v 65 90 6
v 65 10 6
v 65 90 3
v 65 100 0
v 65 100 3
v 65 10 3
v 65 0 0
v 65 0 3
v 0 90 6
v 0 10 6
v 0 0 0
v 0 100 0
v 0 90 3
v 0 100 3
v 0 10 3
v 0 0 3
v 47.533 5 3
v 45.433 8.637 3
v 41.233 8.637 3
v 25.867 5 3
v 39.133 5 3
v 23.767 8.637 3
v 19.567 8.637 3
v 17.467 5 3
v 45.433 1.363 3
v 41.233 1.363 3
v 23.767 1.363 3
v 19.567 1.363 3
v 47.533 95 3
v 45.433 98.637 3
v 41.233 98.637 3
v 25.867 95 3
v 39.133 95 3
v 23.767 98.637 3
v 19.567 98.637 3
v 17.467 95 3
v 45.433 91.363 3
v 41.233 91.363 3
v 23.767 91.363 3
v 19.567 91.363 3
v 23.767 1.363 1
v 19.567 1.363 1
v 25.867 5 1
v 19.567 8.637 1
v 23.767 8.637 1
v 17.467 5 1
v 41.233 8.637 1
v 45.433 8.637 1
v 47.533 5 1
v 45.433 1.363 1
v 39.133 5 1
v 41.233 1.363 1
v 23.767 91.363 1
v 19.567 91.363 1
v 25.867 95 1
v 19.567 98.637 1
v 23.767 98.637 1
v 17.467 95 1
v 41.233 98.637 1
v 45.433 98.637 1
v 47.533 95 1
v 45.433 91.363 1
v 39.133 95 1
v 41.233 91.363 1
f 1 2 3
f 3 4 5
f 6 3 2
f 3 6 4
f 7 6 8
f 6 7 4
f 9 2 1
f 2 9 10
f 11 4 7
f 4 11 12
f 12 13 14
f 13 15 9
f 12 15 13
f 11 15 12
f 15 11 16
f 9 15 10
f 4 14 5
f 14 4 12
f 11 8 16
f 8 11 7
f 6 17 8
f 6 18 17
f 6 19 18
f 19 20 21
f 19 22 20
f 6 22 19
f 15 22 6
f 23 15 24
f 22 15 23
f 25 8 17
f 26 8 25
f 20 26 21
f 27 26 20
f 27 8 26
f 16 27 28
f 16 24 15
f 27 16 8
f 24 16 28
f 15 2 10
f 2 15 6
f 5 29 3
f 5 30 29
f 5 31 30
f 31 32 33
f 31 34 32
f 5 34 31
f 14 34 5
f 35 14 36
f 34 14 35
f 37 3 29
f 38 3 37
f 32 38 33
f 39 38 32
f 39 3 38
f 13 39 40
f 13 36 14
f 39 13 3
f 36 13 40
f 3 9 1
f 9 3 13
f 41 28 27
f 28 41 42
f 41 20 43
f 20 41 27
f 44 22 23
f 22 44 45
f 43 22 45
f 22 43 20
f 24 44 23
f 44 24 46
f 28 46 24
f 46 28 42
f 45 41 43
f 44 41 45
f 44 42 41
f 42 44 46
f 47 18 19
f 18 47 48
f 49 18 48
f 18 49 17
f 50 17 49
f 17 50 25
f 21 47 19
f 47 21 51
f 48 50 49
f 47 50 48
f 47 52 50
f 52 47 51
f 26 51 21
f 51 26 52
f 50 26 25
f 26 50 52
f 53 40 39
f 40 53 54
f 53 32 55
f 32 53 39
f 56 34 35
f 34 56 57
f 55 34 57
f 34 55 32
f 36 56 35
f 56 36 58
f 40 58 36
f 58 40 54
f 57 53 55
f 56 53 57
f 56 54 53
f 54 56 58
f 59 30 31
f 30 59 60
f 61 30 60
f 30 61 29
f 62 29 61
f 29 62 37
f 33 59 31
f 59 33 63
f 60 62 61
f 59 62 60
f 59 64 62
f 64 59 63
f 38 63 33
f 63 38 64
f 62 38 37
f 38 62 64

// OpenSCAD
lipHeight = 3;
lipLength = 10;
height = 6;
//length = height + 10 * 2 + lipLength * 2;
length = 100;
width = 65;
protrusionHeight = 2;
protrusionRadius = 4 + .2;
protrusionWidthOffset = width / 3;
protrusionLengthOffset = lipLength / 2;

$fn=6;
union() {
    difference() {
        cube([width, length, height]);
        translate([0, 0, height - lipHeight])
            cube([width, lipLength, lipHeight]);
        translate([0, length - lipLength, height - lipHeight])
            cube([width, lipLength, lipHeight]);
        translate([protrusionWidthOffset, protrusionLengthOffset, height - (lipHeight + protrusionHeight)])
            cylinder(r=protrusionRadius, h=protrusionHeight);
        translate([(width - protrusionWidthOffset), protrusionLengthOffset, height - (lipHeight + protrusionHeight)])
            cylinder(r=protrusionRadius, h=protrusionHeight);
        translate([protrusionWidthOffset, length - protrusionLengthOffset, height - (lipHeight + protrusionHeight)])
            cylinder(r=protrusionRadius, h=protrusionHeight);
        translate([(width - protrusionWidthOffset), length - protrusionLengthOffset, height - (lipHeight + protrusionHeight)])
            cylinder(r=protrusionRadius, h=protrusionHeight);
//        translate([0, length / 2 - height / 2, height - lipHeight])
//            cube([width, height, lipHeight]);
    };
};
